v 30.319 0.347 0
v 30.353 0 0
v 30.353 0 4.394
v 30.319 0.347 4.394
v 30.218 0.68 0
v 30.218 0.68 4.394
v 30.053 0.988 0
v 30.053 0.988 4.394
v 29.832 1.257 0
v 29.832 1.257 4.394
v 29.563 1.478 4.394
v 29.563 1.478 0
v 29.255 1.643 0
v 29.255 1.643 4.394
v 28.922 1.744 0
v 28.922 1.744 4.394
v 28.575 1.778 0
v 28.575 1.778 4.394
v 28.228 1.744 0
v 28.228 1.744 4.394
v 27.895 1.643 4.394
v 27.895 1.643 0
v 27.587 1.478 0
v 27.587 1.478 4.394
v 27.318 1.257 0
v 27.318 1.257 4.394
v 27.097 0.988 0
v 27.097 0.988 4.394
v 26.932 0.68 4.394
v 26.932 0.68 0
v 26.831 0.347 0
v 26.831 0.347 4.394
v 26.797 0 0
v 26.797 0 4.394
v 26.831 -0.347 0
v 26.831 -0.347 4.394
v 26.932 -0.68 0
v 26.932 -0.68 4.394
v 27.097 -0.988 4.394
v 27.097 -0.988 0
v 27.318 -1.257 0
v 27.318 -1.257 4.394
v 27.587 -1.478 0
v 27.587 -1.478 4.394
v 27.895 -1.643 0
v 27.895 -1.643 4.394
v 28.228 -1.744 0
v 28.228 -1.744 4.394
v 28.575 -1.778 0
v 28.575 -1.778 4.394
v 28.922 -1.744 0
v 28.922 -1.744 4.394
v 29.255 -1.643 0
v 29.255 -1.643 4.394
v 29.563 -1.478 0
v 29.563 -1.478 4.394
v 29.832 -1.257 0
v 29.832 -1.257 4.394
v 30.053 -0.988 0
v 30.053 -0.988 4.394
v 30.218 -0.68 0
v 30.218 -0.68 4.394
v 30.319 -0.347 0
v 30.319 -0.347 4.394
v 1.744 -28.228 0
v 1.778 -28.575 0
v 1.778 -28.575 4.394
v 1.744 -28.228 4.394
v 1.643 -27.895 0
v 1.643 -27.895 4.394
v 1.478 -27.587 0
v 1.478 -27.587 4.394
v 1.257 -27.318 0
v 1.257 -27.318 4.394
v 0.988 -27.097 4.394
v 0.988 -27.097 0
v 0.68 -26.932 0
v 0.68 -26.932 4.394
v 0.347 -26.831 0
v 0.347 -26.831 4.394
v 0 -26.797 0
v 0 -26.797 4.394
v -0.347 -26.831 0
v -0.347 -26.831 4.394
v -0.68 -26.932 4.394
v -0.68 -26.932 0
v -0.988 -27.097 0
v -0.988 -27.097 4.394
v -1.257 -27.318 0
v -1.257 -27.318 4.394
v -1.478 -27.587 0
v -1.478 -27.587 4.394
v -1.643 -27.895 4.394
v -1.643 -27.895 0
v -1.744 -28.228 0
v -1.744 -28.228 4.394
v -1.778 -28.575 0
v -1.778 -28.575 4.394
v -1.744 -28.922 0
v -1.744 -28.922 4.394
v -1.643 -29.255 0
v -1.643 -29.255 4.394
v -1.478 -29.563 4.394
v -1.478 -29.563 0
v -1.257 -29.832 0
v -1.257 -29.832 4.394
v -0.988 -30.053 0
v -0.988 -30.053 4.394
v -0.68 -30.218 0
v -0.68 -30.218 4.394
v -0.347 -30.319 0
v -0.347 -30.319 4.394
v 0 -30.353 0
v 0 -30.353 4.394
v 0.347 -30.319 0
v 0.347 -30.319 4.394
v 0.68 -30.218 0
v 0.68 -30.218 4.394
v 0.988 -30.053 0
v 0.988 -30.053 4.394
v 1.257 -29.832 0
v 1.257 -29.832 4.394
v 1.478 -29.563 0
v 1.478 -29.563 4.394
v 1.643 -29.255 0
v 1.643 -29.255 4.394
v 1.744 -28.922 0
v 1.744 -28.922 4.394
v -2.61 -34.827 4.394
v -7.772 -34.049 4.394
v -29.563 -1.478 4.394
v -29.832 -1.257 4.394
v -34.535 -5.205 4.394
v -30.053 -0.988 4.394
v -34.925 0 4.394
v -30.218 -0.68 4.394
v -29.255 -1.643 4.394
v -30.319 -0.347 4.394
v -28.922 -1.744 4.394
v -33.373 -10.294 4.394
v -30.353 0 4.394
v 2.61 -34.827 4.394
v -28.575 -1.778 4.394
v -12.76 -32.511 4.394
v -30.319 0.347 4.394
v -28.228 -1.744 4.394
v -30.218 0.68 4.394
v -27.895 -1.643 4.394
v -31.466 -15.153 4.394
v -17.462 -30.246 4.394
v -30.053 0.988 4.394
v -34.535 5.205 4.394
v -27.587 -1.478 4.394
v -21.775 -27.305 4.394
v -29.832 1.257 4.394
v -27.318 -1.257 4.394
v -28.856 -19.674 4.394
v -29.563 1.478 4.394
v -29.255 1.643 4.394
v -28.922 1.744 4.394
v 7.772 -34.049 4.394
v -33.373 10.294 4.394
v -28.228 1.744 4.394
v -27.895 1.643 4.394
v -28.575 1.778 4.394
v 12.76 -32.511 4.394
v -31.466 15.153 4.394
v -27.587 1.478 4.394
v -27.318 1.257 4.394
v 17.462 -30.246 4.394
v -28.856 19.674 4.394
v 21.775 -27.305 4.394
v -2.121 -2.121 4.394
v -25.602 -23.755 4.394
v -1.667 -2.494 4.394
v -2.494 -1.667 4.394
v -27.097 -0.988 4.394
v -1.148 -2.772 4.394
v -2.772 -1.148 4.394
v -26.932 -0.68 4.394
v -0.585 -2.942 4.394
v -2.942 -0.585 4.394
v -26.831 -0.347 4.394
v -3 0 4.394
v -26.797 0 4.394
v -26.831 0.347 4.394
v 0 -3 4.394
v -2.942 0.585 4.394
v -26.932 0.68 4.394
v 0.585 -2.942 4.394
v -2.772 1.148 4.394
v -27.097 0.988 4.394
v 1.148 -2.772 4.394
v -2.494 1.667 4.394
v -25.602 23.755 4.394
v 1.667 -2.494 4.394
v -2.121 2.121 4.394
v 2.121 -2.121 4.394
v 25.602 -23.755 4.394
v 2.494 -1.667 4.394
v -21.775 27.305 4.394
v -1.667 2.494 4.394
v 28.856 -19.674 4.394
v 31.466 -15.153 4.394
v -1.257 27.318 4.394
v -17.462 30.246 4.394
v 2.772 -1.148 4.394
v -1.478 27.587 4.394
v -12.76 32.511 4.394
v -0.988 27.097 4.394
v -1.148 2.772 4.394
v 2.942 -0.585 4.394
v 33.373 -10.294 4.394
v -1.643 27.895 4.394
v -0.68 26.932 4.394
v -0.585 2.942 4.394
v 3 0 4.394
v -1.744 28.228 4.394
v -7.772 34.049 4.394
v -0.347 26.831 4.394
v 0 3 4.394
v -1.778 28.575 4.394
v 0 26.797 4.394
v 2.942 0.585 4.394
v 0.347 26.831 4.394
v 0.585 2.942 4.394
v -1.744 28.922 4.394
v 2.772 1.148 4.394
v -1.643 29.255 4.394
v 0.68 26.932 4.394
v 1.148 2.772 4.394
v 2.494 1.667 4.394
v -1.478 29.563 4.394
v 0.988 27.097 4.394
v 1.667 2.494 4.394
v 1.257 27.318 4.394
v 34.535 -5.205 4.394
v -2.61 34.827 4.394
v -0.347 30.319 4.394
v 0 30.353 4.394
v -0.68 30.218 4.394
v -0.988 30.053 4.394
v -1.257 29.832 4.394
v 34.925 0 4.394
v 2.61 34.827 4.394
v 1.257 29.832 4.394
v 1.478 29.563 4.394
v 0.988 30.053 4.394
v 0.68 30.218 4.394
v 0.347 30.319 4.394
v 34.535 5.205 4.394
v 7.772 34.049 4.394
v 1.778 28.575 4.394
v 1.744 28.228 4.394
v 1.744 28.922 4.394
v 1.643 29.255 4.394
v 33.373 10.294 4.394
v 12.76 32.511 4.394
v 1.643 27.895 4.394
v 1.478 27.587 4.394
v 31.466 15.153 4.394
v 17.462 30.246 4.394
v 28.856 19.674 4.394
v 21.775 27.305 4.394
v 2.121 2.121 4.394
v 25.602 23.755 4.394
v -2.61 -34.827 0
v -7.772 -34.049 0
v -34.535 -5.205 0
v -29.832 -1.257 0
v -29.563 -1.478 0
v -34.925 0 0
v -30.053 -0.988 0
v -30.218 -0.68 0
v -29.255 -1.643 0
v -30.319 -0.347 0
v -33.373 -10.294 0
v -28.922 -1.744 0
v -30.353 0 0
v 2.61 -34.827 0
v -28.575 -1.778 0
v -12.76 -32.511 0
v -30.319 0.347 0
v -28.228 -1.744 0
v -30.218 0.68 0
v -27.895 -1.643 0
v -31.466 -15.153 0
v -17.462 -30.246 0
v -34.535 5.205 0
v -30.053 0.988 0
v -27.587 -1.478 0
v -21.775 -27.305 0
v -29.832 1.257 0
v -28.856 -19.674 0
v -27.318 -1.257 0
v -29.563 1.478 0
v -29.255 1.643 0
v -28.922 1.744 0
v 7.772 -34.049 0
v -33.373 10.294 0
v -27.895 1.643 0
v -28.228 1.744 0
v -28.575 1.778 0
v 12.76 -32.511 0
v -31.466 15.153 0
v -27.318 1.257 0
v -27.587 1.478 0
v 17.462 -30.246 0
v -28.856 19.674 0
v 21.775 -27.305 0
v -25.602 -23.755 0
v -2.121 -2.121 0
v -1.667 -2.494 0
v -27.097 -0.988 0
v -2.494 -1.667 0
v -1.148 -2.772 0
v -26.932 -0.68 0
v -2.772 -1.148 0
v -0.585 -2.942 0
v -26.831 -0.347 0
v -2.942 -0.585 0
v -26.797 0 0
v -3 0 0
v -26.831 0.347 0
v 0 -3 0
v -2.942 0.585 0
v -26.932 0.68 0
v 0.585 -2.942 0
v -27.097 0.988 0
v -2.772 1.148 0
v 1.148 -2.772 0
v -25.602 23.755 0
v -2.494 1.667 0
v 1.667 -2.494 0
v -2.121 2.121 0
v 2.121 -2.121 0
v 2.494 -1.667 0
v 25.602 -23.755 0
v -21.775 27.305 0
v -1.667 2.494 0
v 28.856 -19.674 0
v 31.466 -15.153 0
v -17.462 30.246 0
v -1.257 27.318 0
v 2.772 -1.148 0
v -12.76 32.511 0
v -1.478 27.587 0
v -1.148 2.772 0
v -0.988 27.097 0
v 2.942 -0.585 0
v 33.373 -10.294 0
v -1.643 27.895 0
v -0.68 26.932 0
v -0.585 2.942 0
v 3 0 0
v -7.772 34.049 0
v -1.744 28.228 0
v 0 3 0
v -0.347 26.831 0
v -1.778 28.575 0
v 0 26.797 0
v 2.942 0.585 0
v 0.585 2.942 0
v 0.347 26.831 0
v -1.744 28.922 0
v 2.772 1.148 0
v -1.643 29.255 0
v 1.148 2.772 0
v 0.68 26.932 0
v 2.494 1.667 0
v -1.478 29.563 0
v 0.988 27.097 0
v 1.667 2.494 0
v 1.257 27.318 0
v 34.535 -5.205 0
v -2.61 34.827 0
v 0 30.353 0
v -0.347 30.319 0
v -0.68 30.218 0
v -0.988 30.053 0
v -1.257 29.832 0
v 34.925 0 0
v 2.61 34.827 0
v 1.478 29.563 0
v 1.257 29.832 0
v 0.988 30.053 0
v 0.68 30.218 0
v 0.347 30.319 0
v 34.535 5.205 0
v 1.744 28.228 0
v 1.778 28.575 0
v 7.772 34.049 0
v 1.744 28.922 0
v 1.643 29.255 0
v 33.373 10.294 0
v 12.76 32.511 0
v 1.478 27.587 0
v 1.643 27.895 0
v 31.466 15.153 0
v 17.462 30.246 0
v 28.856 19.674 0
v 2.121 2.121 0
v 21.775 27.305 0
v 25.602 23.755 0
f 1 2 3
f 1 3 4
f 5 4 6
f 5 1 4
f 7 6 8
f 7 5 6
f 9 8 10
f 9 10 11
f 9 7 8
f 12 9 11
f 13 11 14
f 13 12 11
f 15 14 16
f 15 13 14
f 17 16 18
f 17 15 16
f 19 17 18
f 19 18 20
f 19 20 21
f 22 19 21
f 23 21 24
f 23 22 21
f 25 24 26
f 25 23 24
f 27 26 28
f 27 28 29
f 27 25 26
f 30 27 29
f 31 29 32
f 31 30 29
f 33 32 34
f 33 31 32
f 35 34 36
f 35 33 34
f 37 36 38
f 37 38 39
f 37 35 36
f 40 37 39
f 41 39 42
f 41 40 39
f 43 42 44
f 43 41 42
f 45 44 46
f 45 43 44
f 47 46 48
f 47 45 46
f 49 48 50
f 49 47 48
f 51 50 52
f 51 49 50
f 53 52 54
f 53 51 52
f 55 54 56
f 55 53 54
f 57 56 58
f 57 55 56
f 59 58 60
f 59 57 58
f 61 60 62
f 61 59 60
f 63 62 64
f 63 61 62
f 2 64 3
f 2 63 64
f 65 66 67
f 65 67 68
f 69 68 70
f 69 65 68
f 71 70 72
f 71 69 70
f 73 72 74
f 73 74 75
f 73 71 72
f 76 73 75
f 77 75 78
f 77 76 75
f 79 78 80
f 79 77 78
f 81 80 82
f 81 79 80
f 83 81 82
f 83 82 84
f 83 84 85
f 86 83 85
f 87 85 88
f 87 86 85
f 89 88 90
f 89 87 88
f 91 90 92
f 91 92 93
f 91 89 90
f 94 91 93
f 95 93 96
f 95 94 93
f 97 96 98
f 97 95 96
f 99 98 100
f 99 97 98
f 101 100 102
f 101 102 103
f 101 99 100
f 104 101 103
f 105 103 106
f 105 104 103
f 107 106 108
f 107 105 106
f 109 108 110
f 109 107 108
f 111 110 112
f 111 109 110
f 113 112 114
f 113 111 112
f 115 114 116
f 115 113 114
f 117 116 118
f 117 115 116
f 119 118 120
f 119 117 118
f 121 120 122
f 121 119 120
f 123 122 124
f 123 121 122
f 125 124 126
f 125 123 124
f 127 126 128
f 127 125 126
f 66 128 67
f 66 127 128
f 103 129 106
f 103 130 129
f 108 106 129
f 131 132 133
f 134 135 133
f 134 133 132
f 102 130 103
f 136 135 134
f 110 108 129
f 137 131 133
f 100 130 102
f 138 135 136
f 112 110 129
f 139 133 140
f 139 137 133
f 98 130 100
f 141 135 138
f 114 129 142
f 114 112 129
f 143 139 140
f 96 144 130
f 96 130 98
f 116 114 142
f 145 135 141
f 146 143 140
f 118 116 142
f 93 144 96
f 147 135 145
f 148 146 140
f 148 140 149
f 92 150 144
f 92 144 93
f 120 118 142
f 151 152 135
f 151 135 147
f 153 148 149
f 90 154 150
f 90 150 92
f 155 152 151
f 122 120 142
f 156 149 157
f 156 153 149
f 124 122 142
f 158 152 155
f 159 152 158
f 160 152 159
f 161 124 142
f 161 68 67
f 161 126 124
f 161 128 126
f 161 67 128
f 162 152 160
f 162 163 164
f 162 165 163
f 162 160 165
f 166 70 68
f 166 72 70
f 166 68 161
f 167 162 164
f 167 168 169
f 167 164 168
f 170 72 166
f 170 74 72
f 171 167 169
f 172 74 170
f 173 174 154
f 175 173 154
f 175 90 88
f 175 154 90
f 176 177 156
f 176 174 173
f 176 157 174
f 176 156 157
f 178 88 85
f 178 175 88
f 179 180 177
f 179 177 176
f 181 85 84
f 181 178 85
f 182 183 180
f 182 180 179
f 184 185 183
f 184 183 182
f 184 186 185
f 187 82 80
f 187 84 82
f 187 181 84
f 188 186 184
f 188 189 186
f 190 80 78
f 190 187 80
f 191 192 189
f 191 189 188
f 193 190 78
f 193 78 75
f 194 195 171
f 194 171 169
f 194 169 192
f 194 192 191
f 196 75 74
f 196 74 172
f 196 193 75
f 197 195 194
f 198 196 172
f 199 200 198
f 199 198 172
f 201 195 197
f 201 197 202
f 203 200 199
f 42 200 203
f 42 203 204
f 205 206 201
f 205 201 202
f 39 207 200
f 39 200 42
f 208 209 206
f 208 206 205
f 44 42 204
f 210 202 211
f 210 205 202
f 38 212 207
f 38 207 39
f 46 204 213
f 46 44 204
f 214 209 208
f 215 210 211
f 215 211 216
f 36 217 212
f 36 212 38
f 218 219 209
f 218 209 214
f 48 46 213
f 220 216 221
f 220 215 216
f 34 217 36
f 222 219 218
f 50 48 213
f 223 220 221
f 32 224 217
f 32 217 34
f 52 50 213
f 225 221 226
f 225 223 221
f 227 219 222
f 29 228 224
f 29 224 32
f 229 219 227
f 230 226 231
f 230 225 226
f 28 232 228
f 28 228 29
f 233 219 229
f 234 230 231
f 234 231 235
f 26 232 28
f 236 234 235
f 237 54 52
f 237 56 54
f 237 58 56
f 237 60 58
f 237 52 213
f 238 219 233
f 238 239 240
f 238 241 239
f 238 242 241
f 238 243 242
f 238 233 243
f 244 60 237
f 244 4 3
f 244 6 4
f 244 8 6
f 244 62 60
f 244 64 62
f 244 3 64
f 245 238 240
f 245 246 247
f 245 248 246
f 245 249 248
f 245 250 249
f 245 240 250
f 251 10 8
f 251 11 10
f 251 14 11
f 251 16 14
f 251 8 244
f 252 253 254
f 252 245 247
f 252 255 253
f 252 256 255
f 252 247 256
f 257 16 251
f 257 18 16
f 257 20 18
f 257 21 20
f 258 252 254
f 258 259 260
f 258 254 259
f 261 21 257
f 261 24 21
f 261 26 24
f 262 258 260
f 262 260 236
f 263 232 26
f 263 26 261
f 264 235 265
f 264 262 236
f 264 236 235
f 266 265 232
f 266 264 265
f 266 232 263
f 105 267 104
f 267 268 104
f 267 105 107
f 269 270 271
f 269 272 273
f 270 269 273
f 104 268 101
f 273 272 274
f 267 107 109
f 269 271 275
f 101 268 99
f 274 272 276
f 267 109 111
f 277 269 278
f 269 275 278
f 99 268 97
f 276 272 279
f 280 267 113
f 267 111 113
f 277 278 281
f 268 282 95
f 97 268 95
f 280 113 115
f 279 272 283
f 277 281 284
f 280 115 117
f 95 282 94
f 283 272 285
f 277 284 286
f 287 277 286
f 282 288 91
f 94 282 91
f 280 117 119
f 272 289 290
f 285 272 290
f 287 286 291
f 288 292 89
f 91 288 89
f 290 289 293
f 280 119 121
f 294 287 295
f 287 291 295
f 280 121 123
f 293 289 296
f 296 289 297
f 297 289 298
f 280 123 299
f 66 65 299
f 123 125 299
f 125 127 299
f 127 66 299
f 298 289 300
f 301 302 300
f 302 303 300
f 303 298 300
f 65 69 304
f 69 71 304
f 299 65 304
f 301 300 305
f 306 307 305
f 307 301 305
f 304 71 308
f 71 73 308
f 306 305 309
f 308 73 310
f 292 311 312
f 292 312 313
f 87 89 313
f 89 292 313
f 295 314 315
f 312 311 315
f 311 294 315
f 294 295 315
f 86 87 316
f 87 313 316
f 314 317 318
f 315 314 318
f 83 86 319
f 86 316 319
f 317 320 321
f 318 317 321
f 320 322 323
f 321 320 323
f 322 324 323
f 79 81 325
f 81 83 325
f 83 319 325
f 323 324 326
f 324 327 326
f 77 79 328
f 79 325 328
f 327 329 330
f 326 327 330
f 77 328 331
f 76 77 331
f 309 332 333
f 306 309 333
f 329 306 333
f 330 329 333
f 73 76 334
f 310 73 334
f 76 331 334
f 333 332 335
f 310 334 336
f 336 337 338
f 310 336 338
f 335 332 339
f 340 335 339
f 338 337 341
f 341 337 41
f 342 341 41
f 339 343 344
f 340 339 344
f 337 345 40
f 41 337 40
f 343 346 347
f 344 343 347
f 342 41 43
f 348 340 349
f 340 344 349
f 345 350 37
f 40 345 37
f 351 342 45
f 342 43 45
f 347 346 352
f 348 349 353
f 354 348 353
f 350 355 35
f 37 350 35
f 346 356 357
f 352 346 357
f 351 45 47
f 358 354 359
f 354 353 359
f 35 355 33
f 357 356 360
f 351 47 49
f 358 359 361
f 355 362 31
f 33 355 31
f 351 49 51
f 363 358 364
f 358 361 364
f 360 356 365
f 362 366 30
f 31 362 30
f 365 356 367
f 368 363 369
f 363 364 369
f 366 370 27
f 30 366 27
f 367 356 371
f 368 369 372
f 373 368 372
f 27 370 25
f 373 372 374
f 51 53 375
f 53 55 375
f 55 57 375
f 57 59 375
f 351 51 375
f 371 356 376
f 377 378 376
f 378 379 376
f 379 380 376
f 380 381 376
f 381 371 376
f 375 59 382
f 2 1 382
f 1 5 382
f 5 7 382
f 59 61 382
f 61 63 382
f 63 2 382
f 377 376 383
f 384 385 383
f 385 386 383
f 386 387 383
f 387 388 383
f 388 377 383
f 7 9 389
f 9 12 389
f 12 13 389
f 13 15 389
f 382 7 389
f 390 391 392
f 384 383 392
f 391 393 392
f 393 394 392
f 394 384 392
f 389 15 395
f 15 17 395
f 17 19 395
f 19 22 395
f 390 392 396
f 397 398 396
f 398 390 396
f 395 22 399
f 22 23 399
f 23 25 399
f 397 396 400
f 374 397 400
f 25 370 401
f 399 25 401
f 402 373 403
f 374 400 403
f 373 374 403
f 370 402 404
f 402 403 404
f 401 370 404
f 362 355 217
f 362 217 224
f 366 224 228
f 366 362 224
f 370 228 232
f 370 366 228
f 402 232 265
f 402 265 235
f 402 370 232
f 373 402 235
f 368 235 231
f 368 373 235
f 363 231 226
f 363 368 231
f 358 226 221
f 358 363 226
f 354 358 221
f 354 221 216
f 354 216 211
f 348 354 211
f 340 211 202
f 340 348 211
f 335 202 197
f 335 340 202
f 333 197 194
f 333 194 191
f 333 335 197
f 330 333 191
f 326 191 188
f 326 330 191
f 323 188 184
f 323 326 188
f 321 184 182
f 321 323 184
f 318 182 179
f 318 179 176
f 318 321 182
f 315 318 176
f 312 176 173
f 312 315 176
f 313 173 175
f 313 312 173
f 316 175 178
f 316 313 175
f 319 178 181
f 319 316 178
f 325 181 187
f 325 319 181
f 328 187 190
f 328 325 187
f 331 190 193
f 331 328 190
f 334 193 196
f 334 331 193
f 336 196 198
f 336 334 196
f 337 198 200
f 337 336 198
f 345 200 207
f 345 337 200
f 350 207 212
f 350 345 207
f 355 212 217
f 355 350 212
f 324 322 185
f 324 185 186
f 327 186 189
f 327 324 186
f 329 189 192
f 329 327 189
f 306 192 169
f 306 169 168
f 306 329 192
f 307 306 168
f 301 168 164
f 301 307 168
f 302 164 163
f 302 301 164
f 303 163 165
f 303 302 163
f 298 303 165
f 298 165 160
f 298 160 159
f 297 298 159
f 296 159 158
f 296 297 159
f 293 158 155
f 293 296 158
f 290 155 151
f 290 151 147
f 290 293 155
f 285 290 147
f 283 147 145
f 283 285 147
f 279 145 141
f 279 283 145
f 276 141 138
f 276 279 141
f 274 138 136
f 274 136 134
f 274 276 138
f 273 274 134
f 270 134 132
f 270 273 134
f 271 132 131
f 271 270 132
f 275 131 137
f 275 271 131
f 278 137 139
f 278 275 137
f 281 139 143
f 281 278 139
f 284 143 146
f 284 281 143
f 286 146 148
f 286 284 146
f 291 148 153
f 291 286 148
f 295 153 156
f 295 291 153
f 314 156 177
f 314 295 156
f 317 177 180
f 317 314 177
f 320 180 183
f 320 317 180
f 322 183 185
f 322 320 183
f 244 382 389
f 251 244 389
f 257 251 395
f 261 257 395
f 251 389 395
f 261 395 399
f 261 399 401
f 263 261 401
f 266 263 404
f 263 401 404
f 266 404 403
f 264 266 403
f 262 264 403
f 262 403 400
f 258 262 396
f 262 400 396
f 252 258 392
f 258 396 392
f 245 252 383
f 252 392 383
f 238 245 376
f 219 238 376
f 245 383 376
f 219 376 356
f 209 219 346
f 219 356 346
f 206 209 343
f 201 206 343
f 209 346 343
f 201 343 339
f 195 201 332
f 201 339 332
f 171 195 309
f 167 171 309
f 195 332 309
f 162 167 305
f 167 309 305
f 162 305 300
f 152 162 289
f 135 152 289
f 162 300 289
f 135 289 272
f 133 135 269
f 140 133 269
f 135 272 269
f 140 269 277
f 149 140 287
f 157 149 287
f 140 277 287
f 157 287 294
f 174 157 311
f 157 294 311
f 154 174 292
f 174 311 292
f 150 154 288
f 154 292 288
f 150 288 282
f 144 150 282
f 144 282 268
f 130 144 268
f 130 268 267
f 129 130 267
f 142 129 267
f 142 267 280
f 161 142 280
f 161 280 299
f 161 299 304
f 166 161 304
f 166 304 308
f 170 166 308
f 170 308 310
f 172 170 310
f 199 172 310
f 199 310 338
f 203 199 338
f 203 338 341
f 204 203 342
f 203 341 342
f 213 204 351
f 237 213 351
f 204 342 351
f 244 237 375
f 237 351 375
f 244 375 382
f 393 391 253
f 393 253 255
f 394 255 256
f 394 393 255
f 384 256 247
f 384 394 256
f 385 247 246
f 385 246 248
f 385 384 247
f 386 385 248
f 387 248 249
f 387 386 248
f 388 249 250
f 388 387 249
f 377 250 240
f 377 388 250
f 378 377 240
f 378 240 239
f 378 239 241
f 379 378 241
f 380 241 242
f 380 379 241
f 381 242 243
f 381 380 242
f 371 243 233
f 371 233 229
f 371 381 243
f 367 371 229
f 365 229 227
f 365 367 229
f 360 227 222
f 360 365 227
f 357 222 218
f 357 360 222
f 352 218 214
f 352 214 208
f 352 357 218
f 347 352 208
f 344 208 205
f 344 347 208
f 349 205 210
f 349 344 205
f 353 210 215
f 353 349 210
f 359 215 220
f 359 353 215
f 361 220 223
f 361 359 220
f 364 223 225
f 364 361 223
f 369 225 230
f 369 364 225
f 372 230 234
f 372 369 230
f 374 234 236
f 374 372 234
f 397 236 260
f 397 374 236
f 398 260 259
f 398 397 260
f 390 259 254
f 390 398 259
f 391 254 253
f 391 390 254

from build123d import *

# Parameters (mm, degrees)
SKETCH1_R           = 34.925
SKETCH1_R_2         = 3
SKETCH1_R_3         = 1.778
BOSS_EXTRUDE1_DEPTH = 4.3942


with BuildPart() as part:
    # Sketch1 → Boss-Extrude1 (new body)
    with BuildSketch(Plane.XY):
        Circle(SKETCH1_R)
        Circle(SKETCH1_R_2, mode=Mode.SUBTRACT)
        with Locations((0, 28.575)):
            Circle(SKETCH1_R_3, mode=Mode.SUBTRACT)
        with Locations((28.575, 0)):
            Circle(SKETCH1_R_3, mode=Mode.SUBTRACT)
        with Locations((0, -28.575)):
            Circle(SKETCH1_R_3, mode=Mode.SUBTRACT)
        with Locations((-28.575, 0)):
            Circle(SKETCH1_R_3, mode=Mode.SUBTRACT)
    extrude(amount=BOSS_EXTRUDE1_DEPTH)


solid = part.part
